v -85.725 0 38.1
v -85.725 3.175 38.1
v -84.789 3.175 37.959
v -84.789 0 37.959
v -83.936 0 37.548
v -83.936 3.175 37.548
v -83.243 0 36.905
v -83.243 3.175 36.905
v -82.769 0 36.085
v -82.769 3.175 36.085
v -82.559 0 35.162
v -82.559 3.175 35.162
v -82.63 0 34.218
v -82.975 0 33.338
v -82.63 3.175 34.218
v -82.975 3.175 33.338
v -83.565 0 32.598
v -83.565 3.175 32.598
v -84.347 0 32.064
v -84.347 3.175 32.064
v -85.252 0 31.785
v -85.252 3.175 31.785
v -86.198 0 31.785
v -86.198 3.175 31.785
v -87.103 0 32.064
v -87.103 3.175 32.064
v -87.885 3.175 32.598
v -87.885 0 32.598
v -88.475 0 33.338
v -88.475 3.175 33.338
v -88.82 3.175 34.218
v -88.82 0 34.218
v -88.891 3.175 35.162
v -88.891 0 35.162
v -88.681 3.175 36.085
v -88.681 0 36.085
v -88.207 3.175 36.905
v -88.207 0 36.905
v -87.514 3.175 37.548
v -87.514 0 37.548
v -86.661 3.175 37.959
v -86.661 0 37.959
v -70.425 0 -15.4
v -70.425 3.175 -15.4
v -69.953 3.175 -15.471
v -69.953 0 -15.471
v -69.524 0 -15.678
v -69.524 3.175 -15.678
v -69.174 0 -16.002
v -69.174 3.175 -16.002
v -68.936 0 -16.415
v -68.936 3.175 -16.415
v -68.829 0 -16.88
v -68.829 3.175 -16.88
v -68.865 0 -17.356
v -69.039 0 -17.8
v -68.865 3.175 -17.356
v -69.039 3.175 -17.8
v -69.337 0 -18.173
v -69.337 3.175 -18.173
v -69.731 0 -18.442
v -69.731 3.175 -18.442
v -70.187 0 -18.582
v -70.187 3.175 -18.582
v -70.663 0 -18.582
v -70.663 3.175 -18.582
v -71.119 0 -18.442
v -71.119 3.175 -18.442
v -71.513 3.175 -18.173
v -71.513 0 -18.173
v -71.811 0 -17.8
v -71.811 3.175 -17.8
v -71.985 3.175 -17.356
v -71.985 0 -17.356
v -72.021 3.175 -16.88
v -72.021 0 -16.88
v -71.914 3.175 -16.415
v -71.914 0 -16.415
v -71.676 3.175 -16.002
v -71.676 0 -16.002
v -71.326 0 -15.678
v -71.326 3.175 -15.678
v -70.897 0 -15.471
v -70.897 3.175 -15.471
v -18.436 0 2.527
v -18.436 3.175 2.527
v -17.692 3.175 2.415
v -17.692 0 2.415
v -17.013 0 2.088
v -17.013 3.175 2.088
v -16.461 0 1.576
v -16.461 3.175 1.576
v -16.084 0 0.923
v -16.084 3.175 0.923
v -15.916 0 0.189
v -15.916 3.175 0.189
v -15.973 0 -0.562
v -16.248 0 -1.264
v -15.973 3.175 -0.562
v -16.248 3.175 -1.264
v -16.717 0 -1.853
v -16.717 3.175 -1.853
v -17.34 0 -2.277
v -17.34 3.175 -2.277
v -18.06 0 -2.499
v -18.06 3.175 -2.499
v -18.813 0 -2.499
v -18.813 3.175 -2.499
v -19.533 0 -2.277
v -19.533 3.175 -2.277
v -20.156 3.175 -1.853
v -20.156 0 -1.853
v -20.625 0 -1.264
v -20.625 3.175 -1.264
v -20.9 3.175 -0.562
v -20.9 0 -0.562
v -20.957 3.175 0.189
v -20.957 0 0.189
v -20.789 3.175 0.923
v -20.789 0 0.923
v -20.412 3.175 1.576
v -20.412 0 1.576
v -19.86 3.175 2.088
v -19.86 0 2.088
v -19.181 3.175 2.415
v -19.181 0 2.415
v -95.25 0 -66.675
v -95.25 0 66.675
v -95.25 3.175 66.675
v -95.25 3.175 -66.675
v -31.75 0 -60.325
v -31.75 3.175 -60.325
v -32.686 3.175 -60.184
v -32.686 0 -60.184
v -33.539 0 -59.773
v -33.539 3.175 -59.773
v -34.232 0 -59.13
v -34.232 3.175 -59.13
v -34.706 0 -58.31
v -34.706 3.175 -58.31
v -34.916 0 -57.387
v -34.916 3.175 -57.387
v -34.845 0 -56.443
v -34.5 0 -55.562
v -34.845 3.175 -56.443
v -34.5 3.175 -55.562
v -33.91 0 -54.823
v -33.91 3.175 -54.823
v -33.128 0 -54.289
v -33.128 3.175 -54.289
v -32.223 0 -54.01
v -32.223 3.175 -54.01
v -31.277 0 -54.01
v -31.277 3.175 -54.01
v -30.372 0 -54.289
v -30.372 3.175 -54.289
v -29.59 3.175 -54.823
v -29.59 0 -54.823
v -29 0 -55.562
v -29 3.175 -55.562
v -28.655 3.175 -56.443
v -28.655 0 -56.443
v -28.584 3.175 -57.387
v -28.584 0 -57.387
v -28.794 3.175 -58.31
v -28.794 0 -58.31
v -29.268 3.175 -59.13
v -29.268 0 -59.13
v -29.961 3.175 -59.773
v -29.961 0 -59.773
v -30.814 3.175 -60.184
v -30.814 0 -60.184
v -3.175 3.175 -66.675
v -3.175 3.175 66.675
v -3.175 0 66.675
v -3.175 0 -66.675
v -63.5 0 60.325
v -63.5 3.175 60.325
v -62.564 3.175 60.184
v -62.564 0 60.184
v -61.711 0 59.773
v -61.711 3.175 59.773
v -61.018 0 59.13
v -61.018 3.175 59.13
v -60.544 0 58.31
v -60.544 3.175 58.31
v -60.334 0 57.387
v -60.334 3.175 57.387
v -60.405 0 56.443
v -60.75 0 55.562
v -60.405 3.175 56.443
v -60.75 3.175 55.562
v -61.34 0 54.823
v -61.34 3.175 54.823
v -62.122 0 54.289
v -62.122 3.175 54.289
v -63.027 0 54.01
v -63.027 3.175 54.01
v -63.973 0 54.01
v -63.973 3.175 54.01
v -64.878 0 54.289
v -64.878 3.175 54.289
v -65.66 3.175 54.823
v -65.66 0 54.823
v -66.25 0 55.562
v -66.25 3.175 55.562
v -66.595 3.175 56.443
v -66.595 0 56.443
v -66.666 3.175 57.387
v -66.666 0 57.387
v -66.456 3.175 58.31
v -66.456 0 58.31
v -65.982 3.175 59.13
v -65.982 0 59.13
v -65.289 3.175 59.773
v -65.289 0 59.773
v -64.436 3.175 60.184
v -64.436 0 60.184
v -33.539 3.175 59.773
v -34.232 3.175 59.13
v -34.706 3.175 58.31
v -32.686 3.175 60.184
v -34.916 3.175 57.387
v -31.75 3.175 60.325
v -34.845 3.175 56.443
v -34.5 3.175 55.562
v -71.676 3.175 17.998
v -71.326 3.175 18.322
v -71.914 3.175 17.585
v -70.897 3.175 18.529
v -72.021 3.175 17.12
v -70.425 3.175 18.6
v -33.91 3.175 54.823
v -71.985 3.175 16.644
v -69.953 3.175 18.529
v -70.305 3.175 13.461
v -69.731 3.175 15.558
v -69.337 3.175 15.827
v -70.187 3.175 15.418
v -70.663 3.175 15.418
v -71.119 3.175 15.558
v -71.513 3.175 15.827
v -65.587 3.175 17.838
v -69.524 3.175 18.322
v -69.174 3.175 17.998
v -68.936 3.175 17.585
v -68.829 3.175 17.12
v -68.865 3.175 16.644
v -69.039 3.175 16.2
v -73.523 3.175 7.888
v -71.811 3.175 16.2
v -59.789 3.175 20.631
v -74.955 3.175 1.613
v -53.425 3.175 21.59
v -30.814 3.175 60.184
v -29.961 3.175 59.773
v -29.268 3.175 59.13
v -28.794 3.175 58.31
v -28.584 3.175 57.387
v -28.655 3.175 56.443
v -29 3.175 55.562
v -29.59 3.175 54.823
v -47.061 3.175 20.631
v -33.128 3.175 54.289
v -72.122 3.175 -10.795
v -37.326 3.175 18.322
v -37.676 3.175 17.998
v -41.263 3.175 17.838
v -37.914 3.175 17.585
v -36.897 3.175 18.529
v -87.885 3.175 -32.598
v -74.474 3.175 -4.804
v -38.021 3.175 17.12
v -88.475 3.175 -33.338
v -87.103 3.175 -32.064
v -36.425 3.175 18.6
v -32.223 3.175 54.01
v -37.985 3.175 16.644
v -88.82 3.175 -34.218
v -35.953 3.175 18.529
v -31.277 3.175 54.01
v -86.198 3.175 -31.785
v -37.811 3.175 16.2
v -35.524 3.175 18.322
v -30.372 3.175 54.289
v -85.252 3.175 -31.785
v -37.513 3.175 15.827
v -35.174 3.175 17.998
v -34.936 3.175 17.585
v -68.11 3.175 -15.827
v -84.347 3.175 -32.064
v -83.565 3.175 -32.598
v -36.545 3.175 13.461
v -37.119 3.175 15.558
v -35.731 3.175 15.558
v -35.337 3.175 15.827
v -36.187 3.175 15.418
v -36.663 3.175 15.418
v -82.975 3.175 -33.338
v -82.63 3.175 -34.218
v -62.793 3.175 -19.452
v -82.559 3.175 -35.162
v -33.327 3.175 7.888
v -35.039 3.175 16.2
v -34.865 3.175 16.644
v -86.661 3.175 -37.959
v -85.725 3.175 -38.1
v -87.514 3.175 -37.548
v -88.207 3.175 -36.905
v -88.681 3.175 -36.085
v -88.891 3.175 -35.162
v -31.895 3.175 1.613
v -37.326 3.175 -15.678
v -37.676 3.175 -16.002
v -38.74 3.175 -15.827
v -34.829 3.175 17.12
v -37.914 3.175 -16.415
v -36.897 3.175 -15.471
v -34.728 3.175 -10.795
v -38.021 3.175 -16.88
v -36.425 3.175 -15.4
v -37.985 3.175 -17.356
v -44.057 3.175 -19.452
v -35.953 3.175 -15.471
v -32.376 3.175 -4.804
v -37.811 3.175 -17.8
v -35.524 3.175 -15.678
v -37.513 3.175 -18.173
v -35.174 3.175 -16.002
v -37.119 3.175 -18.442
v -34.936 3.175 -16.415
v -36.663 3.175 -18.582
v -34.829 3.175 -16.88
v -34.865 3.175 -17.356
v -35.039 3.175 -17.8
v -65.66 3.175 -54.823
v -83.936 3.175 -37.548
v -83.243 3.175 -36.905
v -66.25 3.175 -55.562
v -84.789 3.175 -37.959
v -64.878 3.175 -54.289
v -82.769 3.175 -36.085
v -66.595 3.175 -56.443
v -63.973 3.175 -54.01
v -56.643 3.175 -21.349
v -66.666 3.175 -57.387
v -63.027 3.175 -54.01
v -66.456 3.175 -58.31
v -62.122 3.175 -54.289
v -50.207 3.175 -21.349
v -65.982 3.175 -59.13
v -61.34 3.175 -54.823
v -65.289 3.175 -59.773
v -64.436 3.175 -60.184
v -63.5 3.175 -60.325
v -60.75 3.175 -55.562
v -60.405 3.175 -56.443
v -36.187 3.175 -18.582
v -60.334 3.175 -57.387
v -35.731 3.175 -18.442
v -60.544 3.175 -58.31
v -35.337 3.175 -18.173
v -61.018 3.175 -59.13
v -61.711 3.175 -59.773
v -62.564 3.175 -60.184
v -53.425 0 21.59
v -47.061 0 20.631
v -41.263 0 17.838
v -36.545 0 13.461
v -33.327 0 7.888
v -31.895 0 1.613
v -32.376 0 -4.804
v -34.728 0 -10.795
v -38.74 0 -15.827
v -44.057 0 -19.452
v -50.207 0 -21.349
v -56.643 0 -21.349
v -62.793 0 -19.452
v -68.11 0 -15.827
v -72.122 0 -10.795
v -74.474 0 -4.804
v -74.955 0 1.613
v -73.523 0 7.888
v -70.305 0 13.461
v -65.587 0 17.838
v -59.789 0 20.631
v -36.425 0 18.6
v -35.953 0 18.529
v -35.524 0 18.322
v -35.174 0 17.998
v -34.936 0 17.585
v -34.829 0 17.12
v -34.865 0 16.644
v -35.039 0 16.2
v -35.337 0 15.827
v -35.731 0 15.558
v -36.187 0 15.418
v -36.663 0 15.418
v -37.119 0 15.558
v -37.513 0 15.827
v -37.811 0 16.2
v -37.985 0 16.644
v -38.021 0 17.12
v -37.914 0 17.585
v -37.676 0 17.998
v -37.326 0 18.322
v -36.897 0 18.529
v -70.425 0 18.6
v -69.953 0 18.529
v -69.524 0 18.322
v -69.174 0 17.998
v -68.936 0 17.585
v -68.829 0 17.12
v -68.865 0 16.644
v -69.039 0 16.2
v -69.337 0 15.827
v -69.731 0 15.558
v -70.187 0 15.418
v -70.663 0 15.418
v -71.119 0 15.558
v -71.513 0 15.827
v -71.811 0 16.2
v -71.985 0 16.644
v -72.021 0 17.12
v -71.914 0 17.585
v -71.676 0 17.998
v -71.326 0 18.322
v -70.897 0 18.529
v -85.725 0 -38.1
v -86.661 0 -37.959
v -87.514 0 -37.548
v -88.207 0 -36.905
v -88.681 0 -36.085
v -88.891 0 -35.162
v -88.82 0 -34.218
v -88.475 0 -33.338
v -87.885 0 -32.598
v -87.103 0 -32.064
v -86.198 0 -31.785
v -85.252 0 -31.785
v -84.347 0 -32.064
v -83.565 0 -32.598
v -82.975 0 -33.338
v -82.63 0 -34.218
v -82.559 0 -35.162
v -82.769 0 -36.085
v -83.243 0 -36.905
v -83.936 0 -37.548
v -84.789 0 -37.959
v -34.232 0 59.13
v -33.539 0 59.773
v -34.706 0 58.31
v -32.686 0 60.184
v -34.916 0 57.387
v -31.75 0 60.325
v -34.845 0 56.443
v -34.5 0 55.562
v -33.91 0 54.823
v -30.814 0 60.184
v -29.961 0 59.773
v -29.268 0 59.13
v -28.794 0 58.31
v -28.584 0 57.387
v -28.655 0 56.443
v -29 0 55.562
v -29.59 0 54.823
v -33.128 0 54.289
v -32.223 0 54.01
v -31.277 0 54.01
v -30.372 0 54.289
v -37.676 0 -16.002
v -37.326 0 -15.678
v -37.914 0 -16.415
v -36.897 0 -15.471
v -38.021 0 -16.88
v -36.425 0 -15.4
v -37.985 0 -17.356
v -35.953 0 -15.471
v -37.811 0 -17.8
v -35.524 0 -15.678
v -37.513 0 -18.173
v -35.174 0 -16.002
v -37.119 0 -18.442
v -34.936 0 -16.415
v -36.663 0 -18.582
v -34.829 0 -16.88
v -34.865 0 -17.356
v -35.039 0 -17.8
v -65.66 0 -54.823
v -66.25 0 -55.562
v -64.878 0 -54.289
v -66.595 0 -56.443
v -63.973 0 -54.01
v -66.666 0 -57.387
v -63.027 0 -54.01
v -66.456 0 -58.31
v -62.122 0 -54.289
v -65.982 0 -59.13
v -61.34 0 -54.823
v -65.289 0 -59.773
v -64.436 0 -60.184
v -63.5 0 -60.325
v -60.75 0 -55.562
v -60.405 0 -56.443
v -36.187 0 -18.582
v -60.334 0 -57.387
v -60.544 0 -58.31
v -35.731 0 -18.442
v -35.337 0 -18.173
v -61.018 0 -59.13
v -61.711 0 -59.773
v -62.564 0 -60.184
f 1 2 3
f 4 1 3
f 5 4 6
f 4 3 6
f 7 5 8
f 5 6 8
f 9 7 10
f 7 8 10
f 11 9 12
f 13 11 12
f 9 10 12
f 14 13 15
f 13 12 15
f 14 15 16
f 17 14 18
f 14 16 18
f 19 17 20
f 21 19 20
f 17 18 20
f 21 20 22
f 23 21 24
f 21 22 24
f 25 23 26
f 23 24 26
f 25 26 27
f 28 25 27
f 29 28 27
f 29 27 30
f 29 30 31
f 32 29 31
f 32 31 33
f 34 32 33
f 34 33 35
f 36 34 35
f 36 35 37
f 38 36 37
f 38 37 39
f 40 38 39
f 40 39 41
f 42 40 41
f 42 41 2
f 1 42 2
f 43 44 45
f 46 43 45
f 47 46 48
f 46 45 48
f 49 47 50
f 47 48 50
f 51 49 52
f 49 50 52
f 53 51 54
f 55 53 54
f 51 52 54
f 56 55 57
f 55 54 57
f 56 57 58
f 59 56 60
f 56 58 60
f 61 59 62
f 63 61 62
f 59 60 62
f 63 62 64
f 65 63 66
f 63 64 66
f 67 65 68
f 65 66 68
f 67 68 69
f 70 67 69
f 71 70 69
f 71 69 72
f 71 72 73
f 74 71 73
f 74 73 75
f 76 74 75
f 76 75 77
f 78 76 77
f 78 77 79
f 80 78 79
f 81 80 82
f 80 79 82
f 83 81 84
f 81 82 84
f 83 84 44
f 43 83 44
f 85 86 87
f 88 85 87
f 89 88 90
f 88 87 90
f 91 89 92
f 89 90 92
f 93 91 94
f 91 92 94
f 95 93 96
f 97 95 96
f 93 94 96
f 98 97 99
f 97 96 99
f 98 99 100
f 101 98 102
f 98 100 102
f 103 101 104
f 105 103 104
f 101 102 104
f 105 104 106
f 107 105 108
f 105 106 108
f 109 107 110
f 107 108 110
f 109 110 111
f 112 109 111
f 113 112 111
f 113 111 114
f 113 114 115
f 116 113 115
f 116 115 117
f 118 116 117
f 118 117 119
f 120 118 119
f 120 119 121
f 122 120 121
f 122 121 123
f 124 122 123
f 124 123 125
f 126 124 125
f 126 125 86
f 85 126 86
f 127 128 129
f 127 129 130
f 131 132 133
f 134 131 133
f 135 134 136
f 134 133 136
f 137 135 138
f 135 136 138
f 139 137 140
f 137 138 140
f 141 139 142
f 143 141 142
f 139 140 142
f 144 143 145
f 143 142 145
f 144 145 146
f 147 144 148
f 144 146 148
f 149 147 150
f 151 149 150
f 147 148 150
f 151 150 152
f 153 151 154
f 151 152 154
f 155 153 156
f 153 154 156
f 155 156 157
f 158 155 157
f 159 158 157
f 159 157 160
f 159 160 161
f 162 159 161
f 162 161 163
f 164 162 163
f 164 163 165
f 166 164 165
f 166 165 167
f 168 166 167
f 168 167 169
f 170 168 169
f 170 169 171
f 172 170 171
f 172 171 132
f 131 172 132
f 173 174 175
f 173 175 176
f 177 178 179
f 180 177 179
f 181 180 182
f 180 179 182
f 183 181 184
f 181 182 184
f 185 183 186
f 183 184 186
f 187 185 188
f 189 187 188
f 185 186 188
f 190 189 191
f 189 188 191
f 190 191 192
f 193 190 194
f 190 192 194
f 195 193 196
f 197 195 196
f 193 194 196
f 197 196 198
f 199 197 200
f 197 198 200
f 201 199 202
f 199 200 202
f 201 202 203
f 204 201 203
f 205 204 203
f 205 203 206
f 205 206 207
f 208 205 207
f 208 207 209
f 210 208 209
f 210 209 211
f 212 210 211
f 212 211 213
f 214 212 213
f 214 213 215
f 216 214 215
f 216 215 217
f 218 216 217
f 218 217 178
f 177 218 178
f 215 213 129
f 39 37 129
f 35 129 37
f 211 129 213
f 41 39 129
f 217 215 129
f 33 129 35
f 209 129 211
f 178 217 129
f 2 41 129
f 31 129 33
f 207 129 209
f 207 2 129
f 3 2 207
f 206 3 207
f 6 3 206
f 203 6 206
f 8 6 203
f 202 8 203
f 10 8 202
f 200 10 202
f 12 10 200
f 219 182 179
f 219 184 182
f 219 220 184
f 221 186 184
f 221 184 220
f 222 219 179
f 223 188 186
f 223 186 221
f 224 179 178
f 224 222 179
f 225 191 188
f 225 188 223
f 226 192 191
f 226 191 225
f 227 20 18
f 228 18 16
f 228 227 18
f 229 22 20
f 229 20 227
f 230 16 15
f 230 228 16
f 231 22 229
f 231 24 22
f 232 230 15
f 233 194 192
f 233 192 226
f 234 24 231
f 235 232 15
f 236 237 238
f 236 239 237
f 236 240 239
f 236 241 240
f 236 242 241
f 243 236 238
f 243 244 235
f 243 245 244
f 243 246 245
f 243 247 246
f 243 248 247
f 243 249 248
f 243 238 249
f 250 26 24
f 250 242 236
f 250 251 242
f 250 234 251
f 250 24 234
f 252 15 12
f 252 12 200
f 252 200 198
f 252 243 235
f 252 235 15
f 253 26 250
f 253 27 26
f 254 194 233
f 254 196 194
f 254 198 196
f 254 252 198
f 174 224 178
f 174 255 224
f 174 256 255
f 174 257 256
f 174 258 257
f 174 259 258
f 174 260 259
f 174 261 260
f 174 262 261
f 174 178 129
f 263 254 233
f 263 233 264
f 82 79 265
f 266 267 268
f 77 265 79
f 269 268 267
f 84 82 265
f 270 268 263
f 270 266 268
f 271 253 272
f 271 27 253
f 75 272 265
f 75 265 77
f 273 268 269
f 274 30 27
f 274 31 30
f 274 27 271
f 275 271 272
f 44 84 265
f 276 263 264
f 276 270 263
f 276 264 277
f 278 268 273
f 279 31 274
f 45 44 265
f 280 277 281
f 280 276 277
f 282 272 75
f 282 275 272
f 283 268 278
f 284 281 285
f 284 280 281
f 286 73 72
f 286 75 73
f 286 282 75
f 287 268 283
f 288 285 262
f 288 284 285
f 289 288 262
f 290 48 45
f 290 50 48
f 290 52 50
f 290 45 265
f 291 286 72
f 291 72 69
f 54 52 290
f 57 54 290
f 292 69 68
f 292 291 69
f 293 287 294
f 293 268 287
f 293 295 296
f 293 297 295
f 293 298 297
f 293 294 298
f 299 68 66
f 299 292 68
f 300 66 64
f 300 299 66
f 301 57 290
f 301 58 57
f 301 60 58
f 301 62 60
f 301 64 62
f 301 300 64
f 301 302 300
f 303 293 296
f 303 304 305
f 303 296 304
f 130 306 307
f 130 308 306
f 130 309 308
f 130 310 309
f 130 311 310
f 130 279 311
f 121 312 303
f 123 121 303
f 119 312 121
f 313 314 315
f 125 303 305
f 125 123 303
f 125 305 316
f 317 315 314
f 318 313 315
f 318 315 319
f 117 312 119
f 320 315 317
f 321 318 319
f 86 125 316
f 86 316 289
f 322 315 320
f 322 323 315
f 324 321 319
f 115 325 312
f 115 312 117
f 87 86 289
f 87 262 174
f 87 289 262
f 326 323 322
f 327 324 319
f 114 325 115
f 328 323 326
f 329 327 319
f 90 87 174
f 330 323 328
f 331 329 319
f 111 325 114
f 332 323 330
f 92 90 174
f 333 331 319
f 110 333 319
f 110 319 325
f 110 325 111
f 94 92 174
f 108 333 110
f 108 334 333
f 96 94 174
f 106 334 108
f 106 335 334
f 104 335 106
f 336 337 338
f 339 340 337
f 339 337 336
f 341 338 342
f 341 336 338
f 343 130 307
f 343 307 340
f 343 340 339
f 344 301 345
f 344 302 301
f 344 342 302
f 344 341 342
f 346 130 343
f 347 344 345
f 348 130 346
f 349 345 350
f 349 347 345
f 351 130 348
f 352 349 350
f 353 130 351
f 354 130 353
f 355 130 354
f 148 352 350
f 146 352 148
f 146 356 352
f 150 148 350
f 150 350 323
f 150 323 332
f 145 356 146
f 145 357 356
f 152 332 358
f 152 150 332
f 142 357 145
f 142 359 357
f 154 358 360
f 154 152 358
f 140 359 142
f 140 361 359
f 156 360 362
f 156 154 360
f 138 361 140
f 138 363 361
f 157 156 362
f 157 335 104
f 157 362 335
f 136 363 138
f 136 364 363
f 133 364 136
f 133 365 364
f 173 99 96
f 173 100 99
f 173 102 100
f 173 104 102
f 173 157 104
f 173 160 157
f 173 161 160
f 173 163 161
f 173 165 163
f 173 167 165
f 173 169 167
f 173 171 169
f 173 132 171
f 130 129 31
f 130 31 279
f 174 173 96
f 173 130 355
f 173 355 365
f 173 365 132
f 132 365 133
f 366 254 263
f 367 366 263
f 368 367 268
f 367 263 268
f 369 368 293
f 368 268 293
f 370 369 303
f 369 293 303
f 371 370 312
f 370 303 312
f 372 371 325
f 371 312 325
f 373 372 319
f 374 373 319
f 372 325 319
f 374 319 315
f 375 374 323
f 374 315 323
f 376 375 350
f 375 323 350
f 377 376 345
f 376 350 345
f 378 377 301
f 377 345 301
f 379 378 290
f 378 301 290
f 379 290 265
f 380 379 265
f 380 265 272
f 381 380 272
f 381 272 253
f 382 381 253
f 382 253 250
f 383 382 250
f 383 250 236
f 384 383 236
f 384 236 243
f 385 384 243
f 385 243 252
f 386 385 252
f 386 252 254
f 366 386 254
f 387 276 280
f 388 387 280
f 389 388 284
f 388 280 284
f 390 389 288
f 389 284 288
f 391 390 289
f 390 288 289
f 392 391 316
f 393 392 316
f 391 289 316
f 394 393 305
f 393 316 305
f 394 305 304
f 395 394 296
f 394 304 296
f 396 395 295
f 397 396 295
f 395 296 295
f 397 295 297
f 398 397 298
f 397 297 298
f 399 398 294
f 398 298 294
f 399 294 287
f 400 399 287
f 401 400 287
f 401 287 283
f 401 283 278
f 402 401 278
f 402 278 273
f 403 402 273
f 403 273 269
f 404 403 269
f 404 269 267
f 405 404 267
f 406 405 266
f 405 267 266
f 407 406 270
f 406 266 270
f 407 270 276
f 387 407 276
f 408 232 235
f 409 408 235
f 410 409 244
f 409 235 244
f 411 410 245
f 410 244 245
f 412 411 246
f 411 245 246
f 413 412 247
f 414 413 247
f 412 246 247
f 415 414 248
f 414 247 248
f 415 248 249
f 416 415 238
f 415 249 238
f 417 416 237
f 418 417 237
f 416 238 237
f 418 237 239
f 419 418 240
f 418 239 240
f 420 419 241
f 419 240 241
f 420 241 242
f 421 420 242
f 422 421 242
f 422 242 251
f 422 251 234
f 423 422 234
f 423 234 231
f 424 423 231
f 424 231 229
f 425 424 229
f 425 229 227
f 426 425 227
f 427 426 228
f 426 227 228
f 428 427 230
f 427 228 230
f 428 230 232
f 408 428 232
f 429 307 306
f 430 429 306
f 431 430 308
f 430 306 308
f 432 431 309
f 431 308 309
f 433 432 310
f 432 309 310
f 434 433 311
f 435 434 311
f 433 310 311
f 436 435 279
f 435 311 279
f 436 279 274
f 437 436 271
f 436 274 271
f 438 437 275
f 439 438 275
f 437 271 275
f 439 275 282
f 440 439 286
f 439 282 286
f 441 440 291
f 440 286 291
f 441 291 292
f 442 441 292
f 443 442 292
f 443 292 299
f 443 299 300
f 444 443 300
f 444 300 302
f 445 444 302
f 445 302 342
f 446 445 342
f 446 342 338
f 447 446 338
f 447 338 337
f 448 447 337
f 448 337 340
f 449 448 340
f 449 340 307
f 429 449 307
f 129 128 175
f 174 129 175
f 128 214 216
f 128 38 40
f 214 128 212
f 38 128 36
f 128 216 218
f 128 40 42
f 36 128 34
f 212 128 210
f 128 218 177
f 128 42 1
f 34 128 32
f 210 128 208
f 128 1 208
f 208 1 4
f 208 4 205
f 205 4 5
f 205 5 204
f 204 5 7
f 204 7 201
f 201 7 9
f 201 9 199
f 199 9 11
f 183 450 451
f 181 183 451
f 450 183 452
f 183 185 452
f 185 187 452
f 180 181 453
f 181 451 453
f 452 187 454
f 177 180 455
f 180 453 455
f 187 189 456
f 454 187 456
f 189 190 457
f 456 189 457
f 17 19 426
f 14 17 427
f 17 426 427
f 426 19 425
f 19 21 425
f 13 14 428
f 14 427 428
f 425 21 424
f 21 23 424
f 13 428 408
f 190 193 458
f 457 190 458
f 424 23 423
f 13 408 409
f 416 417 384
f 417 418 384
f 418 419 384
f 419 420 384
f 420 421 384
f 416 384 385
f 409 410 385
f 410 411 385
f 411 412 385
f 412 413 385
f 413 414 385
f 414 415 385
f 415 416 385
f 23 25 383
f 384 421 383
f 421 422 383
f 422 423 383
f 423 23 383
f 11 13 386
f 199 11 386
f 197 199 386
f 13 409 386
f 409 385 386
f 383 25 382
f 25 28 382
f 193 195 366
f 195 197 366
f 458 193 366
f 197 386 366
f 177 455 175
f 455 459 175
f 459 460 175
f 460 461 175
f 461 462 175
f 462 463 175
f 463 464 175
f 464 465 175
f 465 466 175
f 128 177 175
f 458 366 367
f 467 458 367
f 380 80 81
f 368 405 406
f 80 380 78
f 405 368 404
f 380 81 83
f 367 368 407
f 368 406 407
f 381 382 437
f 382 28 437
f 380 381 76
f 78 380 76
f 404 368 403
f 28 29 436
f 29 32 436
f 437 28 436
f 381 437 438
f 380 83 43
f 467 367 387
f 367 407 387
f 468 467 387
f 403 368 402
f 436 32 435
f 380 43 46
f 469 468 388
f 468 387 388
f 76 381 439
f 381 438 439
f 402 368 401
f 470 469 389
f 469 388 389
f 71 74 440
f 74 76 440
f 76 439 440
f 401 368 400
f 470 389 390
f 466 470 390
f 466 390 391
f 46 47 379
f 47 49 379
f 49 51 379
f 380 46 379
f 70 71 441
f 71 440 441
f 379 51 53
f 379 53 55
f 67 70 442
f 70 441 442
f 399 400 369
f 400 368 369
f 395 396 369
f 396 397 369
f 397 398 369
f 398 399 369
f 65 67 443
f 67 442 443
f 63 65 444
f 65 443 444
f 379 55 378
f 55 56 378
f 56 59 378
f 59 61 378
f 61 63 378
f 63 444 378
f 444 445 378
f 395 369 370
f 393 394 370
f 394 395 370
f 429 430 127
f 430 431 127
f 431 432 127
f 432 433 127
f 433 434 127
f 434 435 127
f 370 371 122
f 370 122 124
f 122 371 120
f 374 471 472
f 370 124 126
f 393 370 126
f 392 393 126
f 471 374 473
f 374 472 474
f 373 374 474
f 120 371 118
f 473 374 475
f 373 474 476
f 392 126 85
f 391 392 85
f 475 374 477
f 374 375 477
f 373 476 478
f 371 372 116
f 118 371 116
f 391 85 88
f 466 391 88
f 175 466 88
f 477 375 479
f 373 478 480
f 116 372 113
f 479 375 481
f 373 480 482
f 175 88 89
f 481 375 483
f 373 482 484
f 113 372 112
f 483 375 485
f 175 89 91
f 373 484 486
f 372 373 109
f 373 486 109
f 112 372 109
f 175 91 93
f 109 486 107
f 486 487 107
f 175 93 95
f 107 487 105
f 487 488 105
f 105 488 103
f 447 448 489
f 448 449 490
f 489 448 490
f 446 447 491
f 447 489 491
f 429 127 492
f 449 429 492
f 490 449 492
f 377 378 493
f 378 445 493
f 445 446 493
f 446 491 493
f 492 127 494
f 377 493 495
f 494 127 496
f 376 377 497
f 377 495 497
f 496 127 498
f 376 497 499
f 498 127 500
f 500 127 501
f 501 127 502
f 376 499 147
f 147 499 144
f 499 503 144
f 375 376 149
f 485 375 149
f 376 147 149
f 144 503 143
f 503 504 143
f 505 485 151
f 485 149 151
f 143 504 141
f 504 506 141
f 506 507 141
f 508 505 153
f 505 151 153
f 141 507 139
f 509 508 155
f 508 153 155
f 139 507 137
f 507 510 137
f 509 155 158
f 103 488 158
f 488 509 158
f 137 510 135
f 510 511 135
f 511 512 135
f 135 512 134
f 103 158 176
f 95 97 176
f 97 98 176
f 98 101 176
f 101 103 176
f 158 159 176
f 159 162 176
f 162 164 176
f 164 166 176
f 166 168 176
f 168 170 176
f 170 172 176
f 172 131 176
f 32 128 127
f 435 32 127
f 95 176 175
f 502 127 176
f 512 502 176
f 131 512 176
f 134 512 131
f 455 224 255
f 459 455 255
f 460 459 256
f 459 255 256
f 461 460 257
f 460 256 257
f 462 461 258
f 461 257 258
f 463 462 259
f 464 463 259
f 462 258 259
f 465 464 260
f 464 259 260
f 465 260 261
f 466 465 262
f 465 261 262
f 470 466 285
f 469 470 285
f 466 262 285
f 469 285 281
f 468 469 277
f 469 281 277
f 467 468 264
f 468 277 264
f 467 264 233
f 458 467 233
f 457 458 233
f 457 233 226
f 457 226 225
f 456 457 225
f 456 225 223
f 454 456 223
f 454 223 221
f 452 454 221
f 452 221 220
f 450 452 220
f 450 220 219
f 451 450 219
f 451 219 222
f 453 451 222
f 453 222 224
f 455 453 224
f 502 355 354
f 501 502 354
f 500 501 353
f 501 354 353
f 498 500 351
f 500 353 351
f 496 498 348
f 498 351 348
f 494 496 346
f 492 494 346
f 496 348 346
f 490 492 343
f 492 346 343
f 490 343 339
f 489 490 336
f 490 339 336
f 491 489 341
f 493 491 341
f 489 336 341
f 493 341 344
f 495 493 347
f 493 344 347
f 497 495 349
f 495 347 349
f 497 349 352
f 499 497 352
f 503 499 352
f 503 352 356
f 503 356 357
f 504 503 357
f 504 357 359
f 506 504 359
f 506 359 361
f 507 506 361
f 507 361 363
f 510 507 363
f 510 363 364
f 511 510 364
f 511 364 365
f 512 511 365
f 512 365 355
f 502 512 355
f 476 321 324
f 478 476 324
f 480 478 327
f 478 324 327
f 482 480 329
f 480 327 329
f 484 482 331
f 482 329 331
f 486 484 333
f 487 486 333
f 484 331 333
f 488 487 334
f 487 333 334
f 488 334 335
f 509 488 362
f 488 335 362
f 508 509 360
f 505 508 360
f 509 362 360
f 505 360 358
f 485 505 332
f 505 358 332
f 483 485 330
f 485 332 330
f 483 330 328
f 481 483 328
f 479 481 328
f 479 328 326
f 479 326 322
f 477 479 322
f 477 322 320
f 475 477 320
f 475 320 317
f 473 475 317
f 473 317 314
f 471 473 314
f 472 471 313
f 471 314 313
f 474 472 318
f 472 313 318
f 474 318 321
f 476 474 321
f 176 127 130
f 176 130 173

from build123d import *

# Parameters (mm, degrees)
SKETCH1_W           = 190.5
SKETCH1_H           = 133.35
BOSS_EXTRUDE1_DEPTH = 3.175
SKETCH3_R           = 21.59
CUT_EXTRUDE2_DEPTH  = 117.310785183
SKETCH4_R           = 1.6
SKETCH4_R_2         = 1.599999975
CUT_EXTRUDE3_DEPTH  = 3.175
SKETCH9_R           = 2.5273
CUT_EXTRUDE5_DEPTH  = 10
SKETCH12_W          = 98.425
SKETCH12_H          = 133.35
CUT_EXTRUDE6_DEPTH  = 117.310785183
SKETCH13_R          = 3.175
CUT_EXTRUDE7_DEPTH  = 117.310785183


with BuildPart() as part:
    # Sketch1 → Boss-Extrude1 (new body)
    with BuildSketch(Plane(origin=(0, 0, 0), x_dir=(1, 0, 0), z_dir=(0, 1, 0))):
        Rectangle(SKETCH1_W, SKETCH1_H)
    extrude(amount=BOSS_EXTRUDE1_DEPTH)

    # Sketch3 → Cut-Extrude2 (cut, through all)
    with BuildSketch(Plane(origin=(0, 3.175, 0), x_dir=(1, 0, 0), z_dir=(0, 1, 0))):
        with Locations(Location((-53.425, 0, 0), (0, 0, 270))):
            Circle(SKETCH3_R)
    extrude(amount=-CUT_EXTRUDE2_DEPTH, mode=Mode.SUBTRACT)

    # Sketch4 → Cut-Extrude3 (cut)
    with BuildSketch(Plane(origin=(0, 3.175, 0), x_dir=(1, 0, 0), z_dir=(0, 1, 0))):
        with Locations(Location((-70.425, 17, 0), (0, 0, 270))):
            Circle(SKETCH4_R)
        with Locations(Location((-36.425, 17, 0), (0, 0, 270))):
            Circle(SKETCH4_R_2)
        with Locations(Location((-70.425, -17, 0), (0, 0, 270))):
            Circle(SKETCH4_R)
        with Locations(Location((-36.425, -17, 0), (0, 0, 270))):
            Circle(SKETCH4_R)
    extrude(amount=-CUT_EXTRUDE3_DEPTH, mode=Mode.SUBTRACT)

    # Sketch9 → Cut-Extrude5 (cut)
    with BuildSketch(Plane(origin=(0, 3.175, 0), x_dir=(1, 0, 0), z_dir=(0, 1, 0))):
        with Locations(Location((-18.4365, 0, 0), (0, 0, 270))):
            Circle(SKETCH9_R)
    extrude(amount=-CUT_EXTRUDE5_DEPTH, mode=Mode.SUBTRACT)

    # Sketch12 → Cut-Extrude6 (cut, through all)
    with BuildSketch(Plane(origin=(0, 3.175, 0), x_dir=(1, 0, 0), z_dir=(0, 1, 0))):
        with Locations((46.0375, 0)):
            Rectangle(SKETCH12_W, SKETCH12_H)
    extrude(amount=-CUT_EXTRUDE6_DEPTH, mode=Mode.SUBTRACT)

    # Sketch13 → Cut-Extrude7 (cut, through all)
    with BuildSketch(Plane(origin=(0, 3.175, 0), x_dir=(1, 0, 0), z_dir=(0, 1, 0))):
        with Locations(Location((-63.5, -57.15, 0), (0, 0, 270))):
            Circle(SKETCH13_R)
        with Locations(Location((-31.75, -57.15, 0), (0, 0, 270))):
            Circle(SKETCH13_R)
        with Locations(Location((-85.725, -34.925, 0), (0, 0, 270))):
            Circle(SKETCH13_R)
        with Locations(Location((-85.725, 34.925, 0), (0, 0, 90))):
            Circle(SKETCH13_R)
        with Locations(Location((-31.75, 57.15, 0), (0, 0, 90))):
            Circle(SKETCH13_R)
        with Locations(Location((-63.5, 57.15, 0), (0, 0, 90))):
            Circle(SKETCH13_R)
    extrude(amount=-CUT_EXTRUDE7_DEPTH, mode=Mode.SUBTRACT)


solid = part.part
